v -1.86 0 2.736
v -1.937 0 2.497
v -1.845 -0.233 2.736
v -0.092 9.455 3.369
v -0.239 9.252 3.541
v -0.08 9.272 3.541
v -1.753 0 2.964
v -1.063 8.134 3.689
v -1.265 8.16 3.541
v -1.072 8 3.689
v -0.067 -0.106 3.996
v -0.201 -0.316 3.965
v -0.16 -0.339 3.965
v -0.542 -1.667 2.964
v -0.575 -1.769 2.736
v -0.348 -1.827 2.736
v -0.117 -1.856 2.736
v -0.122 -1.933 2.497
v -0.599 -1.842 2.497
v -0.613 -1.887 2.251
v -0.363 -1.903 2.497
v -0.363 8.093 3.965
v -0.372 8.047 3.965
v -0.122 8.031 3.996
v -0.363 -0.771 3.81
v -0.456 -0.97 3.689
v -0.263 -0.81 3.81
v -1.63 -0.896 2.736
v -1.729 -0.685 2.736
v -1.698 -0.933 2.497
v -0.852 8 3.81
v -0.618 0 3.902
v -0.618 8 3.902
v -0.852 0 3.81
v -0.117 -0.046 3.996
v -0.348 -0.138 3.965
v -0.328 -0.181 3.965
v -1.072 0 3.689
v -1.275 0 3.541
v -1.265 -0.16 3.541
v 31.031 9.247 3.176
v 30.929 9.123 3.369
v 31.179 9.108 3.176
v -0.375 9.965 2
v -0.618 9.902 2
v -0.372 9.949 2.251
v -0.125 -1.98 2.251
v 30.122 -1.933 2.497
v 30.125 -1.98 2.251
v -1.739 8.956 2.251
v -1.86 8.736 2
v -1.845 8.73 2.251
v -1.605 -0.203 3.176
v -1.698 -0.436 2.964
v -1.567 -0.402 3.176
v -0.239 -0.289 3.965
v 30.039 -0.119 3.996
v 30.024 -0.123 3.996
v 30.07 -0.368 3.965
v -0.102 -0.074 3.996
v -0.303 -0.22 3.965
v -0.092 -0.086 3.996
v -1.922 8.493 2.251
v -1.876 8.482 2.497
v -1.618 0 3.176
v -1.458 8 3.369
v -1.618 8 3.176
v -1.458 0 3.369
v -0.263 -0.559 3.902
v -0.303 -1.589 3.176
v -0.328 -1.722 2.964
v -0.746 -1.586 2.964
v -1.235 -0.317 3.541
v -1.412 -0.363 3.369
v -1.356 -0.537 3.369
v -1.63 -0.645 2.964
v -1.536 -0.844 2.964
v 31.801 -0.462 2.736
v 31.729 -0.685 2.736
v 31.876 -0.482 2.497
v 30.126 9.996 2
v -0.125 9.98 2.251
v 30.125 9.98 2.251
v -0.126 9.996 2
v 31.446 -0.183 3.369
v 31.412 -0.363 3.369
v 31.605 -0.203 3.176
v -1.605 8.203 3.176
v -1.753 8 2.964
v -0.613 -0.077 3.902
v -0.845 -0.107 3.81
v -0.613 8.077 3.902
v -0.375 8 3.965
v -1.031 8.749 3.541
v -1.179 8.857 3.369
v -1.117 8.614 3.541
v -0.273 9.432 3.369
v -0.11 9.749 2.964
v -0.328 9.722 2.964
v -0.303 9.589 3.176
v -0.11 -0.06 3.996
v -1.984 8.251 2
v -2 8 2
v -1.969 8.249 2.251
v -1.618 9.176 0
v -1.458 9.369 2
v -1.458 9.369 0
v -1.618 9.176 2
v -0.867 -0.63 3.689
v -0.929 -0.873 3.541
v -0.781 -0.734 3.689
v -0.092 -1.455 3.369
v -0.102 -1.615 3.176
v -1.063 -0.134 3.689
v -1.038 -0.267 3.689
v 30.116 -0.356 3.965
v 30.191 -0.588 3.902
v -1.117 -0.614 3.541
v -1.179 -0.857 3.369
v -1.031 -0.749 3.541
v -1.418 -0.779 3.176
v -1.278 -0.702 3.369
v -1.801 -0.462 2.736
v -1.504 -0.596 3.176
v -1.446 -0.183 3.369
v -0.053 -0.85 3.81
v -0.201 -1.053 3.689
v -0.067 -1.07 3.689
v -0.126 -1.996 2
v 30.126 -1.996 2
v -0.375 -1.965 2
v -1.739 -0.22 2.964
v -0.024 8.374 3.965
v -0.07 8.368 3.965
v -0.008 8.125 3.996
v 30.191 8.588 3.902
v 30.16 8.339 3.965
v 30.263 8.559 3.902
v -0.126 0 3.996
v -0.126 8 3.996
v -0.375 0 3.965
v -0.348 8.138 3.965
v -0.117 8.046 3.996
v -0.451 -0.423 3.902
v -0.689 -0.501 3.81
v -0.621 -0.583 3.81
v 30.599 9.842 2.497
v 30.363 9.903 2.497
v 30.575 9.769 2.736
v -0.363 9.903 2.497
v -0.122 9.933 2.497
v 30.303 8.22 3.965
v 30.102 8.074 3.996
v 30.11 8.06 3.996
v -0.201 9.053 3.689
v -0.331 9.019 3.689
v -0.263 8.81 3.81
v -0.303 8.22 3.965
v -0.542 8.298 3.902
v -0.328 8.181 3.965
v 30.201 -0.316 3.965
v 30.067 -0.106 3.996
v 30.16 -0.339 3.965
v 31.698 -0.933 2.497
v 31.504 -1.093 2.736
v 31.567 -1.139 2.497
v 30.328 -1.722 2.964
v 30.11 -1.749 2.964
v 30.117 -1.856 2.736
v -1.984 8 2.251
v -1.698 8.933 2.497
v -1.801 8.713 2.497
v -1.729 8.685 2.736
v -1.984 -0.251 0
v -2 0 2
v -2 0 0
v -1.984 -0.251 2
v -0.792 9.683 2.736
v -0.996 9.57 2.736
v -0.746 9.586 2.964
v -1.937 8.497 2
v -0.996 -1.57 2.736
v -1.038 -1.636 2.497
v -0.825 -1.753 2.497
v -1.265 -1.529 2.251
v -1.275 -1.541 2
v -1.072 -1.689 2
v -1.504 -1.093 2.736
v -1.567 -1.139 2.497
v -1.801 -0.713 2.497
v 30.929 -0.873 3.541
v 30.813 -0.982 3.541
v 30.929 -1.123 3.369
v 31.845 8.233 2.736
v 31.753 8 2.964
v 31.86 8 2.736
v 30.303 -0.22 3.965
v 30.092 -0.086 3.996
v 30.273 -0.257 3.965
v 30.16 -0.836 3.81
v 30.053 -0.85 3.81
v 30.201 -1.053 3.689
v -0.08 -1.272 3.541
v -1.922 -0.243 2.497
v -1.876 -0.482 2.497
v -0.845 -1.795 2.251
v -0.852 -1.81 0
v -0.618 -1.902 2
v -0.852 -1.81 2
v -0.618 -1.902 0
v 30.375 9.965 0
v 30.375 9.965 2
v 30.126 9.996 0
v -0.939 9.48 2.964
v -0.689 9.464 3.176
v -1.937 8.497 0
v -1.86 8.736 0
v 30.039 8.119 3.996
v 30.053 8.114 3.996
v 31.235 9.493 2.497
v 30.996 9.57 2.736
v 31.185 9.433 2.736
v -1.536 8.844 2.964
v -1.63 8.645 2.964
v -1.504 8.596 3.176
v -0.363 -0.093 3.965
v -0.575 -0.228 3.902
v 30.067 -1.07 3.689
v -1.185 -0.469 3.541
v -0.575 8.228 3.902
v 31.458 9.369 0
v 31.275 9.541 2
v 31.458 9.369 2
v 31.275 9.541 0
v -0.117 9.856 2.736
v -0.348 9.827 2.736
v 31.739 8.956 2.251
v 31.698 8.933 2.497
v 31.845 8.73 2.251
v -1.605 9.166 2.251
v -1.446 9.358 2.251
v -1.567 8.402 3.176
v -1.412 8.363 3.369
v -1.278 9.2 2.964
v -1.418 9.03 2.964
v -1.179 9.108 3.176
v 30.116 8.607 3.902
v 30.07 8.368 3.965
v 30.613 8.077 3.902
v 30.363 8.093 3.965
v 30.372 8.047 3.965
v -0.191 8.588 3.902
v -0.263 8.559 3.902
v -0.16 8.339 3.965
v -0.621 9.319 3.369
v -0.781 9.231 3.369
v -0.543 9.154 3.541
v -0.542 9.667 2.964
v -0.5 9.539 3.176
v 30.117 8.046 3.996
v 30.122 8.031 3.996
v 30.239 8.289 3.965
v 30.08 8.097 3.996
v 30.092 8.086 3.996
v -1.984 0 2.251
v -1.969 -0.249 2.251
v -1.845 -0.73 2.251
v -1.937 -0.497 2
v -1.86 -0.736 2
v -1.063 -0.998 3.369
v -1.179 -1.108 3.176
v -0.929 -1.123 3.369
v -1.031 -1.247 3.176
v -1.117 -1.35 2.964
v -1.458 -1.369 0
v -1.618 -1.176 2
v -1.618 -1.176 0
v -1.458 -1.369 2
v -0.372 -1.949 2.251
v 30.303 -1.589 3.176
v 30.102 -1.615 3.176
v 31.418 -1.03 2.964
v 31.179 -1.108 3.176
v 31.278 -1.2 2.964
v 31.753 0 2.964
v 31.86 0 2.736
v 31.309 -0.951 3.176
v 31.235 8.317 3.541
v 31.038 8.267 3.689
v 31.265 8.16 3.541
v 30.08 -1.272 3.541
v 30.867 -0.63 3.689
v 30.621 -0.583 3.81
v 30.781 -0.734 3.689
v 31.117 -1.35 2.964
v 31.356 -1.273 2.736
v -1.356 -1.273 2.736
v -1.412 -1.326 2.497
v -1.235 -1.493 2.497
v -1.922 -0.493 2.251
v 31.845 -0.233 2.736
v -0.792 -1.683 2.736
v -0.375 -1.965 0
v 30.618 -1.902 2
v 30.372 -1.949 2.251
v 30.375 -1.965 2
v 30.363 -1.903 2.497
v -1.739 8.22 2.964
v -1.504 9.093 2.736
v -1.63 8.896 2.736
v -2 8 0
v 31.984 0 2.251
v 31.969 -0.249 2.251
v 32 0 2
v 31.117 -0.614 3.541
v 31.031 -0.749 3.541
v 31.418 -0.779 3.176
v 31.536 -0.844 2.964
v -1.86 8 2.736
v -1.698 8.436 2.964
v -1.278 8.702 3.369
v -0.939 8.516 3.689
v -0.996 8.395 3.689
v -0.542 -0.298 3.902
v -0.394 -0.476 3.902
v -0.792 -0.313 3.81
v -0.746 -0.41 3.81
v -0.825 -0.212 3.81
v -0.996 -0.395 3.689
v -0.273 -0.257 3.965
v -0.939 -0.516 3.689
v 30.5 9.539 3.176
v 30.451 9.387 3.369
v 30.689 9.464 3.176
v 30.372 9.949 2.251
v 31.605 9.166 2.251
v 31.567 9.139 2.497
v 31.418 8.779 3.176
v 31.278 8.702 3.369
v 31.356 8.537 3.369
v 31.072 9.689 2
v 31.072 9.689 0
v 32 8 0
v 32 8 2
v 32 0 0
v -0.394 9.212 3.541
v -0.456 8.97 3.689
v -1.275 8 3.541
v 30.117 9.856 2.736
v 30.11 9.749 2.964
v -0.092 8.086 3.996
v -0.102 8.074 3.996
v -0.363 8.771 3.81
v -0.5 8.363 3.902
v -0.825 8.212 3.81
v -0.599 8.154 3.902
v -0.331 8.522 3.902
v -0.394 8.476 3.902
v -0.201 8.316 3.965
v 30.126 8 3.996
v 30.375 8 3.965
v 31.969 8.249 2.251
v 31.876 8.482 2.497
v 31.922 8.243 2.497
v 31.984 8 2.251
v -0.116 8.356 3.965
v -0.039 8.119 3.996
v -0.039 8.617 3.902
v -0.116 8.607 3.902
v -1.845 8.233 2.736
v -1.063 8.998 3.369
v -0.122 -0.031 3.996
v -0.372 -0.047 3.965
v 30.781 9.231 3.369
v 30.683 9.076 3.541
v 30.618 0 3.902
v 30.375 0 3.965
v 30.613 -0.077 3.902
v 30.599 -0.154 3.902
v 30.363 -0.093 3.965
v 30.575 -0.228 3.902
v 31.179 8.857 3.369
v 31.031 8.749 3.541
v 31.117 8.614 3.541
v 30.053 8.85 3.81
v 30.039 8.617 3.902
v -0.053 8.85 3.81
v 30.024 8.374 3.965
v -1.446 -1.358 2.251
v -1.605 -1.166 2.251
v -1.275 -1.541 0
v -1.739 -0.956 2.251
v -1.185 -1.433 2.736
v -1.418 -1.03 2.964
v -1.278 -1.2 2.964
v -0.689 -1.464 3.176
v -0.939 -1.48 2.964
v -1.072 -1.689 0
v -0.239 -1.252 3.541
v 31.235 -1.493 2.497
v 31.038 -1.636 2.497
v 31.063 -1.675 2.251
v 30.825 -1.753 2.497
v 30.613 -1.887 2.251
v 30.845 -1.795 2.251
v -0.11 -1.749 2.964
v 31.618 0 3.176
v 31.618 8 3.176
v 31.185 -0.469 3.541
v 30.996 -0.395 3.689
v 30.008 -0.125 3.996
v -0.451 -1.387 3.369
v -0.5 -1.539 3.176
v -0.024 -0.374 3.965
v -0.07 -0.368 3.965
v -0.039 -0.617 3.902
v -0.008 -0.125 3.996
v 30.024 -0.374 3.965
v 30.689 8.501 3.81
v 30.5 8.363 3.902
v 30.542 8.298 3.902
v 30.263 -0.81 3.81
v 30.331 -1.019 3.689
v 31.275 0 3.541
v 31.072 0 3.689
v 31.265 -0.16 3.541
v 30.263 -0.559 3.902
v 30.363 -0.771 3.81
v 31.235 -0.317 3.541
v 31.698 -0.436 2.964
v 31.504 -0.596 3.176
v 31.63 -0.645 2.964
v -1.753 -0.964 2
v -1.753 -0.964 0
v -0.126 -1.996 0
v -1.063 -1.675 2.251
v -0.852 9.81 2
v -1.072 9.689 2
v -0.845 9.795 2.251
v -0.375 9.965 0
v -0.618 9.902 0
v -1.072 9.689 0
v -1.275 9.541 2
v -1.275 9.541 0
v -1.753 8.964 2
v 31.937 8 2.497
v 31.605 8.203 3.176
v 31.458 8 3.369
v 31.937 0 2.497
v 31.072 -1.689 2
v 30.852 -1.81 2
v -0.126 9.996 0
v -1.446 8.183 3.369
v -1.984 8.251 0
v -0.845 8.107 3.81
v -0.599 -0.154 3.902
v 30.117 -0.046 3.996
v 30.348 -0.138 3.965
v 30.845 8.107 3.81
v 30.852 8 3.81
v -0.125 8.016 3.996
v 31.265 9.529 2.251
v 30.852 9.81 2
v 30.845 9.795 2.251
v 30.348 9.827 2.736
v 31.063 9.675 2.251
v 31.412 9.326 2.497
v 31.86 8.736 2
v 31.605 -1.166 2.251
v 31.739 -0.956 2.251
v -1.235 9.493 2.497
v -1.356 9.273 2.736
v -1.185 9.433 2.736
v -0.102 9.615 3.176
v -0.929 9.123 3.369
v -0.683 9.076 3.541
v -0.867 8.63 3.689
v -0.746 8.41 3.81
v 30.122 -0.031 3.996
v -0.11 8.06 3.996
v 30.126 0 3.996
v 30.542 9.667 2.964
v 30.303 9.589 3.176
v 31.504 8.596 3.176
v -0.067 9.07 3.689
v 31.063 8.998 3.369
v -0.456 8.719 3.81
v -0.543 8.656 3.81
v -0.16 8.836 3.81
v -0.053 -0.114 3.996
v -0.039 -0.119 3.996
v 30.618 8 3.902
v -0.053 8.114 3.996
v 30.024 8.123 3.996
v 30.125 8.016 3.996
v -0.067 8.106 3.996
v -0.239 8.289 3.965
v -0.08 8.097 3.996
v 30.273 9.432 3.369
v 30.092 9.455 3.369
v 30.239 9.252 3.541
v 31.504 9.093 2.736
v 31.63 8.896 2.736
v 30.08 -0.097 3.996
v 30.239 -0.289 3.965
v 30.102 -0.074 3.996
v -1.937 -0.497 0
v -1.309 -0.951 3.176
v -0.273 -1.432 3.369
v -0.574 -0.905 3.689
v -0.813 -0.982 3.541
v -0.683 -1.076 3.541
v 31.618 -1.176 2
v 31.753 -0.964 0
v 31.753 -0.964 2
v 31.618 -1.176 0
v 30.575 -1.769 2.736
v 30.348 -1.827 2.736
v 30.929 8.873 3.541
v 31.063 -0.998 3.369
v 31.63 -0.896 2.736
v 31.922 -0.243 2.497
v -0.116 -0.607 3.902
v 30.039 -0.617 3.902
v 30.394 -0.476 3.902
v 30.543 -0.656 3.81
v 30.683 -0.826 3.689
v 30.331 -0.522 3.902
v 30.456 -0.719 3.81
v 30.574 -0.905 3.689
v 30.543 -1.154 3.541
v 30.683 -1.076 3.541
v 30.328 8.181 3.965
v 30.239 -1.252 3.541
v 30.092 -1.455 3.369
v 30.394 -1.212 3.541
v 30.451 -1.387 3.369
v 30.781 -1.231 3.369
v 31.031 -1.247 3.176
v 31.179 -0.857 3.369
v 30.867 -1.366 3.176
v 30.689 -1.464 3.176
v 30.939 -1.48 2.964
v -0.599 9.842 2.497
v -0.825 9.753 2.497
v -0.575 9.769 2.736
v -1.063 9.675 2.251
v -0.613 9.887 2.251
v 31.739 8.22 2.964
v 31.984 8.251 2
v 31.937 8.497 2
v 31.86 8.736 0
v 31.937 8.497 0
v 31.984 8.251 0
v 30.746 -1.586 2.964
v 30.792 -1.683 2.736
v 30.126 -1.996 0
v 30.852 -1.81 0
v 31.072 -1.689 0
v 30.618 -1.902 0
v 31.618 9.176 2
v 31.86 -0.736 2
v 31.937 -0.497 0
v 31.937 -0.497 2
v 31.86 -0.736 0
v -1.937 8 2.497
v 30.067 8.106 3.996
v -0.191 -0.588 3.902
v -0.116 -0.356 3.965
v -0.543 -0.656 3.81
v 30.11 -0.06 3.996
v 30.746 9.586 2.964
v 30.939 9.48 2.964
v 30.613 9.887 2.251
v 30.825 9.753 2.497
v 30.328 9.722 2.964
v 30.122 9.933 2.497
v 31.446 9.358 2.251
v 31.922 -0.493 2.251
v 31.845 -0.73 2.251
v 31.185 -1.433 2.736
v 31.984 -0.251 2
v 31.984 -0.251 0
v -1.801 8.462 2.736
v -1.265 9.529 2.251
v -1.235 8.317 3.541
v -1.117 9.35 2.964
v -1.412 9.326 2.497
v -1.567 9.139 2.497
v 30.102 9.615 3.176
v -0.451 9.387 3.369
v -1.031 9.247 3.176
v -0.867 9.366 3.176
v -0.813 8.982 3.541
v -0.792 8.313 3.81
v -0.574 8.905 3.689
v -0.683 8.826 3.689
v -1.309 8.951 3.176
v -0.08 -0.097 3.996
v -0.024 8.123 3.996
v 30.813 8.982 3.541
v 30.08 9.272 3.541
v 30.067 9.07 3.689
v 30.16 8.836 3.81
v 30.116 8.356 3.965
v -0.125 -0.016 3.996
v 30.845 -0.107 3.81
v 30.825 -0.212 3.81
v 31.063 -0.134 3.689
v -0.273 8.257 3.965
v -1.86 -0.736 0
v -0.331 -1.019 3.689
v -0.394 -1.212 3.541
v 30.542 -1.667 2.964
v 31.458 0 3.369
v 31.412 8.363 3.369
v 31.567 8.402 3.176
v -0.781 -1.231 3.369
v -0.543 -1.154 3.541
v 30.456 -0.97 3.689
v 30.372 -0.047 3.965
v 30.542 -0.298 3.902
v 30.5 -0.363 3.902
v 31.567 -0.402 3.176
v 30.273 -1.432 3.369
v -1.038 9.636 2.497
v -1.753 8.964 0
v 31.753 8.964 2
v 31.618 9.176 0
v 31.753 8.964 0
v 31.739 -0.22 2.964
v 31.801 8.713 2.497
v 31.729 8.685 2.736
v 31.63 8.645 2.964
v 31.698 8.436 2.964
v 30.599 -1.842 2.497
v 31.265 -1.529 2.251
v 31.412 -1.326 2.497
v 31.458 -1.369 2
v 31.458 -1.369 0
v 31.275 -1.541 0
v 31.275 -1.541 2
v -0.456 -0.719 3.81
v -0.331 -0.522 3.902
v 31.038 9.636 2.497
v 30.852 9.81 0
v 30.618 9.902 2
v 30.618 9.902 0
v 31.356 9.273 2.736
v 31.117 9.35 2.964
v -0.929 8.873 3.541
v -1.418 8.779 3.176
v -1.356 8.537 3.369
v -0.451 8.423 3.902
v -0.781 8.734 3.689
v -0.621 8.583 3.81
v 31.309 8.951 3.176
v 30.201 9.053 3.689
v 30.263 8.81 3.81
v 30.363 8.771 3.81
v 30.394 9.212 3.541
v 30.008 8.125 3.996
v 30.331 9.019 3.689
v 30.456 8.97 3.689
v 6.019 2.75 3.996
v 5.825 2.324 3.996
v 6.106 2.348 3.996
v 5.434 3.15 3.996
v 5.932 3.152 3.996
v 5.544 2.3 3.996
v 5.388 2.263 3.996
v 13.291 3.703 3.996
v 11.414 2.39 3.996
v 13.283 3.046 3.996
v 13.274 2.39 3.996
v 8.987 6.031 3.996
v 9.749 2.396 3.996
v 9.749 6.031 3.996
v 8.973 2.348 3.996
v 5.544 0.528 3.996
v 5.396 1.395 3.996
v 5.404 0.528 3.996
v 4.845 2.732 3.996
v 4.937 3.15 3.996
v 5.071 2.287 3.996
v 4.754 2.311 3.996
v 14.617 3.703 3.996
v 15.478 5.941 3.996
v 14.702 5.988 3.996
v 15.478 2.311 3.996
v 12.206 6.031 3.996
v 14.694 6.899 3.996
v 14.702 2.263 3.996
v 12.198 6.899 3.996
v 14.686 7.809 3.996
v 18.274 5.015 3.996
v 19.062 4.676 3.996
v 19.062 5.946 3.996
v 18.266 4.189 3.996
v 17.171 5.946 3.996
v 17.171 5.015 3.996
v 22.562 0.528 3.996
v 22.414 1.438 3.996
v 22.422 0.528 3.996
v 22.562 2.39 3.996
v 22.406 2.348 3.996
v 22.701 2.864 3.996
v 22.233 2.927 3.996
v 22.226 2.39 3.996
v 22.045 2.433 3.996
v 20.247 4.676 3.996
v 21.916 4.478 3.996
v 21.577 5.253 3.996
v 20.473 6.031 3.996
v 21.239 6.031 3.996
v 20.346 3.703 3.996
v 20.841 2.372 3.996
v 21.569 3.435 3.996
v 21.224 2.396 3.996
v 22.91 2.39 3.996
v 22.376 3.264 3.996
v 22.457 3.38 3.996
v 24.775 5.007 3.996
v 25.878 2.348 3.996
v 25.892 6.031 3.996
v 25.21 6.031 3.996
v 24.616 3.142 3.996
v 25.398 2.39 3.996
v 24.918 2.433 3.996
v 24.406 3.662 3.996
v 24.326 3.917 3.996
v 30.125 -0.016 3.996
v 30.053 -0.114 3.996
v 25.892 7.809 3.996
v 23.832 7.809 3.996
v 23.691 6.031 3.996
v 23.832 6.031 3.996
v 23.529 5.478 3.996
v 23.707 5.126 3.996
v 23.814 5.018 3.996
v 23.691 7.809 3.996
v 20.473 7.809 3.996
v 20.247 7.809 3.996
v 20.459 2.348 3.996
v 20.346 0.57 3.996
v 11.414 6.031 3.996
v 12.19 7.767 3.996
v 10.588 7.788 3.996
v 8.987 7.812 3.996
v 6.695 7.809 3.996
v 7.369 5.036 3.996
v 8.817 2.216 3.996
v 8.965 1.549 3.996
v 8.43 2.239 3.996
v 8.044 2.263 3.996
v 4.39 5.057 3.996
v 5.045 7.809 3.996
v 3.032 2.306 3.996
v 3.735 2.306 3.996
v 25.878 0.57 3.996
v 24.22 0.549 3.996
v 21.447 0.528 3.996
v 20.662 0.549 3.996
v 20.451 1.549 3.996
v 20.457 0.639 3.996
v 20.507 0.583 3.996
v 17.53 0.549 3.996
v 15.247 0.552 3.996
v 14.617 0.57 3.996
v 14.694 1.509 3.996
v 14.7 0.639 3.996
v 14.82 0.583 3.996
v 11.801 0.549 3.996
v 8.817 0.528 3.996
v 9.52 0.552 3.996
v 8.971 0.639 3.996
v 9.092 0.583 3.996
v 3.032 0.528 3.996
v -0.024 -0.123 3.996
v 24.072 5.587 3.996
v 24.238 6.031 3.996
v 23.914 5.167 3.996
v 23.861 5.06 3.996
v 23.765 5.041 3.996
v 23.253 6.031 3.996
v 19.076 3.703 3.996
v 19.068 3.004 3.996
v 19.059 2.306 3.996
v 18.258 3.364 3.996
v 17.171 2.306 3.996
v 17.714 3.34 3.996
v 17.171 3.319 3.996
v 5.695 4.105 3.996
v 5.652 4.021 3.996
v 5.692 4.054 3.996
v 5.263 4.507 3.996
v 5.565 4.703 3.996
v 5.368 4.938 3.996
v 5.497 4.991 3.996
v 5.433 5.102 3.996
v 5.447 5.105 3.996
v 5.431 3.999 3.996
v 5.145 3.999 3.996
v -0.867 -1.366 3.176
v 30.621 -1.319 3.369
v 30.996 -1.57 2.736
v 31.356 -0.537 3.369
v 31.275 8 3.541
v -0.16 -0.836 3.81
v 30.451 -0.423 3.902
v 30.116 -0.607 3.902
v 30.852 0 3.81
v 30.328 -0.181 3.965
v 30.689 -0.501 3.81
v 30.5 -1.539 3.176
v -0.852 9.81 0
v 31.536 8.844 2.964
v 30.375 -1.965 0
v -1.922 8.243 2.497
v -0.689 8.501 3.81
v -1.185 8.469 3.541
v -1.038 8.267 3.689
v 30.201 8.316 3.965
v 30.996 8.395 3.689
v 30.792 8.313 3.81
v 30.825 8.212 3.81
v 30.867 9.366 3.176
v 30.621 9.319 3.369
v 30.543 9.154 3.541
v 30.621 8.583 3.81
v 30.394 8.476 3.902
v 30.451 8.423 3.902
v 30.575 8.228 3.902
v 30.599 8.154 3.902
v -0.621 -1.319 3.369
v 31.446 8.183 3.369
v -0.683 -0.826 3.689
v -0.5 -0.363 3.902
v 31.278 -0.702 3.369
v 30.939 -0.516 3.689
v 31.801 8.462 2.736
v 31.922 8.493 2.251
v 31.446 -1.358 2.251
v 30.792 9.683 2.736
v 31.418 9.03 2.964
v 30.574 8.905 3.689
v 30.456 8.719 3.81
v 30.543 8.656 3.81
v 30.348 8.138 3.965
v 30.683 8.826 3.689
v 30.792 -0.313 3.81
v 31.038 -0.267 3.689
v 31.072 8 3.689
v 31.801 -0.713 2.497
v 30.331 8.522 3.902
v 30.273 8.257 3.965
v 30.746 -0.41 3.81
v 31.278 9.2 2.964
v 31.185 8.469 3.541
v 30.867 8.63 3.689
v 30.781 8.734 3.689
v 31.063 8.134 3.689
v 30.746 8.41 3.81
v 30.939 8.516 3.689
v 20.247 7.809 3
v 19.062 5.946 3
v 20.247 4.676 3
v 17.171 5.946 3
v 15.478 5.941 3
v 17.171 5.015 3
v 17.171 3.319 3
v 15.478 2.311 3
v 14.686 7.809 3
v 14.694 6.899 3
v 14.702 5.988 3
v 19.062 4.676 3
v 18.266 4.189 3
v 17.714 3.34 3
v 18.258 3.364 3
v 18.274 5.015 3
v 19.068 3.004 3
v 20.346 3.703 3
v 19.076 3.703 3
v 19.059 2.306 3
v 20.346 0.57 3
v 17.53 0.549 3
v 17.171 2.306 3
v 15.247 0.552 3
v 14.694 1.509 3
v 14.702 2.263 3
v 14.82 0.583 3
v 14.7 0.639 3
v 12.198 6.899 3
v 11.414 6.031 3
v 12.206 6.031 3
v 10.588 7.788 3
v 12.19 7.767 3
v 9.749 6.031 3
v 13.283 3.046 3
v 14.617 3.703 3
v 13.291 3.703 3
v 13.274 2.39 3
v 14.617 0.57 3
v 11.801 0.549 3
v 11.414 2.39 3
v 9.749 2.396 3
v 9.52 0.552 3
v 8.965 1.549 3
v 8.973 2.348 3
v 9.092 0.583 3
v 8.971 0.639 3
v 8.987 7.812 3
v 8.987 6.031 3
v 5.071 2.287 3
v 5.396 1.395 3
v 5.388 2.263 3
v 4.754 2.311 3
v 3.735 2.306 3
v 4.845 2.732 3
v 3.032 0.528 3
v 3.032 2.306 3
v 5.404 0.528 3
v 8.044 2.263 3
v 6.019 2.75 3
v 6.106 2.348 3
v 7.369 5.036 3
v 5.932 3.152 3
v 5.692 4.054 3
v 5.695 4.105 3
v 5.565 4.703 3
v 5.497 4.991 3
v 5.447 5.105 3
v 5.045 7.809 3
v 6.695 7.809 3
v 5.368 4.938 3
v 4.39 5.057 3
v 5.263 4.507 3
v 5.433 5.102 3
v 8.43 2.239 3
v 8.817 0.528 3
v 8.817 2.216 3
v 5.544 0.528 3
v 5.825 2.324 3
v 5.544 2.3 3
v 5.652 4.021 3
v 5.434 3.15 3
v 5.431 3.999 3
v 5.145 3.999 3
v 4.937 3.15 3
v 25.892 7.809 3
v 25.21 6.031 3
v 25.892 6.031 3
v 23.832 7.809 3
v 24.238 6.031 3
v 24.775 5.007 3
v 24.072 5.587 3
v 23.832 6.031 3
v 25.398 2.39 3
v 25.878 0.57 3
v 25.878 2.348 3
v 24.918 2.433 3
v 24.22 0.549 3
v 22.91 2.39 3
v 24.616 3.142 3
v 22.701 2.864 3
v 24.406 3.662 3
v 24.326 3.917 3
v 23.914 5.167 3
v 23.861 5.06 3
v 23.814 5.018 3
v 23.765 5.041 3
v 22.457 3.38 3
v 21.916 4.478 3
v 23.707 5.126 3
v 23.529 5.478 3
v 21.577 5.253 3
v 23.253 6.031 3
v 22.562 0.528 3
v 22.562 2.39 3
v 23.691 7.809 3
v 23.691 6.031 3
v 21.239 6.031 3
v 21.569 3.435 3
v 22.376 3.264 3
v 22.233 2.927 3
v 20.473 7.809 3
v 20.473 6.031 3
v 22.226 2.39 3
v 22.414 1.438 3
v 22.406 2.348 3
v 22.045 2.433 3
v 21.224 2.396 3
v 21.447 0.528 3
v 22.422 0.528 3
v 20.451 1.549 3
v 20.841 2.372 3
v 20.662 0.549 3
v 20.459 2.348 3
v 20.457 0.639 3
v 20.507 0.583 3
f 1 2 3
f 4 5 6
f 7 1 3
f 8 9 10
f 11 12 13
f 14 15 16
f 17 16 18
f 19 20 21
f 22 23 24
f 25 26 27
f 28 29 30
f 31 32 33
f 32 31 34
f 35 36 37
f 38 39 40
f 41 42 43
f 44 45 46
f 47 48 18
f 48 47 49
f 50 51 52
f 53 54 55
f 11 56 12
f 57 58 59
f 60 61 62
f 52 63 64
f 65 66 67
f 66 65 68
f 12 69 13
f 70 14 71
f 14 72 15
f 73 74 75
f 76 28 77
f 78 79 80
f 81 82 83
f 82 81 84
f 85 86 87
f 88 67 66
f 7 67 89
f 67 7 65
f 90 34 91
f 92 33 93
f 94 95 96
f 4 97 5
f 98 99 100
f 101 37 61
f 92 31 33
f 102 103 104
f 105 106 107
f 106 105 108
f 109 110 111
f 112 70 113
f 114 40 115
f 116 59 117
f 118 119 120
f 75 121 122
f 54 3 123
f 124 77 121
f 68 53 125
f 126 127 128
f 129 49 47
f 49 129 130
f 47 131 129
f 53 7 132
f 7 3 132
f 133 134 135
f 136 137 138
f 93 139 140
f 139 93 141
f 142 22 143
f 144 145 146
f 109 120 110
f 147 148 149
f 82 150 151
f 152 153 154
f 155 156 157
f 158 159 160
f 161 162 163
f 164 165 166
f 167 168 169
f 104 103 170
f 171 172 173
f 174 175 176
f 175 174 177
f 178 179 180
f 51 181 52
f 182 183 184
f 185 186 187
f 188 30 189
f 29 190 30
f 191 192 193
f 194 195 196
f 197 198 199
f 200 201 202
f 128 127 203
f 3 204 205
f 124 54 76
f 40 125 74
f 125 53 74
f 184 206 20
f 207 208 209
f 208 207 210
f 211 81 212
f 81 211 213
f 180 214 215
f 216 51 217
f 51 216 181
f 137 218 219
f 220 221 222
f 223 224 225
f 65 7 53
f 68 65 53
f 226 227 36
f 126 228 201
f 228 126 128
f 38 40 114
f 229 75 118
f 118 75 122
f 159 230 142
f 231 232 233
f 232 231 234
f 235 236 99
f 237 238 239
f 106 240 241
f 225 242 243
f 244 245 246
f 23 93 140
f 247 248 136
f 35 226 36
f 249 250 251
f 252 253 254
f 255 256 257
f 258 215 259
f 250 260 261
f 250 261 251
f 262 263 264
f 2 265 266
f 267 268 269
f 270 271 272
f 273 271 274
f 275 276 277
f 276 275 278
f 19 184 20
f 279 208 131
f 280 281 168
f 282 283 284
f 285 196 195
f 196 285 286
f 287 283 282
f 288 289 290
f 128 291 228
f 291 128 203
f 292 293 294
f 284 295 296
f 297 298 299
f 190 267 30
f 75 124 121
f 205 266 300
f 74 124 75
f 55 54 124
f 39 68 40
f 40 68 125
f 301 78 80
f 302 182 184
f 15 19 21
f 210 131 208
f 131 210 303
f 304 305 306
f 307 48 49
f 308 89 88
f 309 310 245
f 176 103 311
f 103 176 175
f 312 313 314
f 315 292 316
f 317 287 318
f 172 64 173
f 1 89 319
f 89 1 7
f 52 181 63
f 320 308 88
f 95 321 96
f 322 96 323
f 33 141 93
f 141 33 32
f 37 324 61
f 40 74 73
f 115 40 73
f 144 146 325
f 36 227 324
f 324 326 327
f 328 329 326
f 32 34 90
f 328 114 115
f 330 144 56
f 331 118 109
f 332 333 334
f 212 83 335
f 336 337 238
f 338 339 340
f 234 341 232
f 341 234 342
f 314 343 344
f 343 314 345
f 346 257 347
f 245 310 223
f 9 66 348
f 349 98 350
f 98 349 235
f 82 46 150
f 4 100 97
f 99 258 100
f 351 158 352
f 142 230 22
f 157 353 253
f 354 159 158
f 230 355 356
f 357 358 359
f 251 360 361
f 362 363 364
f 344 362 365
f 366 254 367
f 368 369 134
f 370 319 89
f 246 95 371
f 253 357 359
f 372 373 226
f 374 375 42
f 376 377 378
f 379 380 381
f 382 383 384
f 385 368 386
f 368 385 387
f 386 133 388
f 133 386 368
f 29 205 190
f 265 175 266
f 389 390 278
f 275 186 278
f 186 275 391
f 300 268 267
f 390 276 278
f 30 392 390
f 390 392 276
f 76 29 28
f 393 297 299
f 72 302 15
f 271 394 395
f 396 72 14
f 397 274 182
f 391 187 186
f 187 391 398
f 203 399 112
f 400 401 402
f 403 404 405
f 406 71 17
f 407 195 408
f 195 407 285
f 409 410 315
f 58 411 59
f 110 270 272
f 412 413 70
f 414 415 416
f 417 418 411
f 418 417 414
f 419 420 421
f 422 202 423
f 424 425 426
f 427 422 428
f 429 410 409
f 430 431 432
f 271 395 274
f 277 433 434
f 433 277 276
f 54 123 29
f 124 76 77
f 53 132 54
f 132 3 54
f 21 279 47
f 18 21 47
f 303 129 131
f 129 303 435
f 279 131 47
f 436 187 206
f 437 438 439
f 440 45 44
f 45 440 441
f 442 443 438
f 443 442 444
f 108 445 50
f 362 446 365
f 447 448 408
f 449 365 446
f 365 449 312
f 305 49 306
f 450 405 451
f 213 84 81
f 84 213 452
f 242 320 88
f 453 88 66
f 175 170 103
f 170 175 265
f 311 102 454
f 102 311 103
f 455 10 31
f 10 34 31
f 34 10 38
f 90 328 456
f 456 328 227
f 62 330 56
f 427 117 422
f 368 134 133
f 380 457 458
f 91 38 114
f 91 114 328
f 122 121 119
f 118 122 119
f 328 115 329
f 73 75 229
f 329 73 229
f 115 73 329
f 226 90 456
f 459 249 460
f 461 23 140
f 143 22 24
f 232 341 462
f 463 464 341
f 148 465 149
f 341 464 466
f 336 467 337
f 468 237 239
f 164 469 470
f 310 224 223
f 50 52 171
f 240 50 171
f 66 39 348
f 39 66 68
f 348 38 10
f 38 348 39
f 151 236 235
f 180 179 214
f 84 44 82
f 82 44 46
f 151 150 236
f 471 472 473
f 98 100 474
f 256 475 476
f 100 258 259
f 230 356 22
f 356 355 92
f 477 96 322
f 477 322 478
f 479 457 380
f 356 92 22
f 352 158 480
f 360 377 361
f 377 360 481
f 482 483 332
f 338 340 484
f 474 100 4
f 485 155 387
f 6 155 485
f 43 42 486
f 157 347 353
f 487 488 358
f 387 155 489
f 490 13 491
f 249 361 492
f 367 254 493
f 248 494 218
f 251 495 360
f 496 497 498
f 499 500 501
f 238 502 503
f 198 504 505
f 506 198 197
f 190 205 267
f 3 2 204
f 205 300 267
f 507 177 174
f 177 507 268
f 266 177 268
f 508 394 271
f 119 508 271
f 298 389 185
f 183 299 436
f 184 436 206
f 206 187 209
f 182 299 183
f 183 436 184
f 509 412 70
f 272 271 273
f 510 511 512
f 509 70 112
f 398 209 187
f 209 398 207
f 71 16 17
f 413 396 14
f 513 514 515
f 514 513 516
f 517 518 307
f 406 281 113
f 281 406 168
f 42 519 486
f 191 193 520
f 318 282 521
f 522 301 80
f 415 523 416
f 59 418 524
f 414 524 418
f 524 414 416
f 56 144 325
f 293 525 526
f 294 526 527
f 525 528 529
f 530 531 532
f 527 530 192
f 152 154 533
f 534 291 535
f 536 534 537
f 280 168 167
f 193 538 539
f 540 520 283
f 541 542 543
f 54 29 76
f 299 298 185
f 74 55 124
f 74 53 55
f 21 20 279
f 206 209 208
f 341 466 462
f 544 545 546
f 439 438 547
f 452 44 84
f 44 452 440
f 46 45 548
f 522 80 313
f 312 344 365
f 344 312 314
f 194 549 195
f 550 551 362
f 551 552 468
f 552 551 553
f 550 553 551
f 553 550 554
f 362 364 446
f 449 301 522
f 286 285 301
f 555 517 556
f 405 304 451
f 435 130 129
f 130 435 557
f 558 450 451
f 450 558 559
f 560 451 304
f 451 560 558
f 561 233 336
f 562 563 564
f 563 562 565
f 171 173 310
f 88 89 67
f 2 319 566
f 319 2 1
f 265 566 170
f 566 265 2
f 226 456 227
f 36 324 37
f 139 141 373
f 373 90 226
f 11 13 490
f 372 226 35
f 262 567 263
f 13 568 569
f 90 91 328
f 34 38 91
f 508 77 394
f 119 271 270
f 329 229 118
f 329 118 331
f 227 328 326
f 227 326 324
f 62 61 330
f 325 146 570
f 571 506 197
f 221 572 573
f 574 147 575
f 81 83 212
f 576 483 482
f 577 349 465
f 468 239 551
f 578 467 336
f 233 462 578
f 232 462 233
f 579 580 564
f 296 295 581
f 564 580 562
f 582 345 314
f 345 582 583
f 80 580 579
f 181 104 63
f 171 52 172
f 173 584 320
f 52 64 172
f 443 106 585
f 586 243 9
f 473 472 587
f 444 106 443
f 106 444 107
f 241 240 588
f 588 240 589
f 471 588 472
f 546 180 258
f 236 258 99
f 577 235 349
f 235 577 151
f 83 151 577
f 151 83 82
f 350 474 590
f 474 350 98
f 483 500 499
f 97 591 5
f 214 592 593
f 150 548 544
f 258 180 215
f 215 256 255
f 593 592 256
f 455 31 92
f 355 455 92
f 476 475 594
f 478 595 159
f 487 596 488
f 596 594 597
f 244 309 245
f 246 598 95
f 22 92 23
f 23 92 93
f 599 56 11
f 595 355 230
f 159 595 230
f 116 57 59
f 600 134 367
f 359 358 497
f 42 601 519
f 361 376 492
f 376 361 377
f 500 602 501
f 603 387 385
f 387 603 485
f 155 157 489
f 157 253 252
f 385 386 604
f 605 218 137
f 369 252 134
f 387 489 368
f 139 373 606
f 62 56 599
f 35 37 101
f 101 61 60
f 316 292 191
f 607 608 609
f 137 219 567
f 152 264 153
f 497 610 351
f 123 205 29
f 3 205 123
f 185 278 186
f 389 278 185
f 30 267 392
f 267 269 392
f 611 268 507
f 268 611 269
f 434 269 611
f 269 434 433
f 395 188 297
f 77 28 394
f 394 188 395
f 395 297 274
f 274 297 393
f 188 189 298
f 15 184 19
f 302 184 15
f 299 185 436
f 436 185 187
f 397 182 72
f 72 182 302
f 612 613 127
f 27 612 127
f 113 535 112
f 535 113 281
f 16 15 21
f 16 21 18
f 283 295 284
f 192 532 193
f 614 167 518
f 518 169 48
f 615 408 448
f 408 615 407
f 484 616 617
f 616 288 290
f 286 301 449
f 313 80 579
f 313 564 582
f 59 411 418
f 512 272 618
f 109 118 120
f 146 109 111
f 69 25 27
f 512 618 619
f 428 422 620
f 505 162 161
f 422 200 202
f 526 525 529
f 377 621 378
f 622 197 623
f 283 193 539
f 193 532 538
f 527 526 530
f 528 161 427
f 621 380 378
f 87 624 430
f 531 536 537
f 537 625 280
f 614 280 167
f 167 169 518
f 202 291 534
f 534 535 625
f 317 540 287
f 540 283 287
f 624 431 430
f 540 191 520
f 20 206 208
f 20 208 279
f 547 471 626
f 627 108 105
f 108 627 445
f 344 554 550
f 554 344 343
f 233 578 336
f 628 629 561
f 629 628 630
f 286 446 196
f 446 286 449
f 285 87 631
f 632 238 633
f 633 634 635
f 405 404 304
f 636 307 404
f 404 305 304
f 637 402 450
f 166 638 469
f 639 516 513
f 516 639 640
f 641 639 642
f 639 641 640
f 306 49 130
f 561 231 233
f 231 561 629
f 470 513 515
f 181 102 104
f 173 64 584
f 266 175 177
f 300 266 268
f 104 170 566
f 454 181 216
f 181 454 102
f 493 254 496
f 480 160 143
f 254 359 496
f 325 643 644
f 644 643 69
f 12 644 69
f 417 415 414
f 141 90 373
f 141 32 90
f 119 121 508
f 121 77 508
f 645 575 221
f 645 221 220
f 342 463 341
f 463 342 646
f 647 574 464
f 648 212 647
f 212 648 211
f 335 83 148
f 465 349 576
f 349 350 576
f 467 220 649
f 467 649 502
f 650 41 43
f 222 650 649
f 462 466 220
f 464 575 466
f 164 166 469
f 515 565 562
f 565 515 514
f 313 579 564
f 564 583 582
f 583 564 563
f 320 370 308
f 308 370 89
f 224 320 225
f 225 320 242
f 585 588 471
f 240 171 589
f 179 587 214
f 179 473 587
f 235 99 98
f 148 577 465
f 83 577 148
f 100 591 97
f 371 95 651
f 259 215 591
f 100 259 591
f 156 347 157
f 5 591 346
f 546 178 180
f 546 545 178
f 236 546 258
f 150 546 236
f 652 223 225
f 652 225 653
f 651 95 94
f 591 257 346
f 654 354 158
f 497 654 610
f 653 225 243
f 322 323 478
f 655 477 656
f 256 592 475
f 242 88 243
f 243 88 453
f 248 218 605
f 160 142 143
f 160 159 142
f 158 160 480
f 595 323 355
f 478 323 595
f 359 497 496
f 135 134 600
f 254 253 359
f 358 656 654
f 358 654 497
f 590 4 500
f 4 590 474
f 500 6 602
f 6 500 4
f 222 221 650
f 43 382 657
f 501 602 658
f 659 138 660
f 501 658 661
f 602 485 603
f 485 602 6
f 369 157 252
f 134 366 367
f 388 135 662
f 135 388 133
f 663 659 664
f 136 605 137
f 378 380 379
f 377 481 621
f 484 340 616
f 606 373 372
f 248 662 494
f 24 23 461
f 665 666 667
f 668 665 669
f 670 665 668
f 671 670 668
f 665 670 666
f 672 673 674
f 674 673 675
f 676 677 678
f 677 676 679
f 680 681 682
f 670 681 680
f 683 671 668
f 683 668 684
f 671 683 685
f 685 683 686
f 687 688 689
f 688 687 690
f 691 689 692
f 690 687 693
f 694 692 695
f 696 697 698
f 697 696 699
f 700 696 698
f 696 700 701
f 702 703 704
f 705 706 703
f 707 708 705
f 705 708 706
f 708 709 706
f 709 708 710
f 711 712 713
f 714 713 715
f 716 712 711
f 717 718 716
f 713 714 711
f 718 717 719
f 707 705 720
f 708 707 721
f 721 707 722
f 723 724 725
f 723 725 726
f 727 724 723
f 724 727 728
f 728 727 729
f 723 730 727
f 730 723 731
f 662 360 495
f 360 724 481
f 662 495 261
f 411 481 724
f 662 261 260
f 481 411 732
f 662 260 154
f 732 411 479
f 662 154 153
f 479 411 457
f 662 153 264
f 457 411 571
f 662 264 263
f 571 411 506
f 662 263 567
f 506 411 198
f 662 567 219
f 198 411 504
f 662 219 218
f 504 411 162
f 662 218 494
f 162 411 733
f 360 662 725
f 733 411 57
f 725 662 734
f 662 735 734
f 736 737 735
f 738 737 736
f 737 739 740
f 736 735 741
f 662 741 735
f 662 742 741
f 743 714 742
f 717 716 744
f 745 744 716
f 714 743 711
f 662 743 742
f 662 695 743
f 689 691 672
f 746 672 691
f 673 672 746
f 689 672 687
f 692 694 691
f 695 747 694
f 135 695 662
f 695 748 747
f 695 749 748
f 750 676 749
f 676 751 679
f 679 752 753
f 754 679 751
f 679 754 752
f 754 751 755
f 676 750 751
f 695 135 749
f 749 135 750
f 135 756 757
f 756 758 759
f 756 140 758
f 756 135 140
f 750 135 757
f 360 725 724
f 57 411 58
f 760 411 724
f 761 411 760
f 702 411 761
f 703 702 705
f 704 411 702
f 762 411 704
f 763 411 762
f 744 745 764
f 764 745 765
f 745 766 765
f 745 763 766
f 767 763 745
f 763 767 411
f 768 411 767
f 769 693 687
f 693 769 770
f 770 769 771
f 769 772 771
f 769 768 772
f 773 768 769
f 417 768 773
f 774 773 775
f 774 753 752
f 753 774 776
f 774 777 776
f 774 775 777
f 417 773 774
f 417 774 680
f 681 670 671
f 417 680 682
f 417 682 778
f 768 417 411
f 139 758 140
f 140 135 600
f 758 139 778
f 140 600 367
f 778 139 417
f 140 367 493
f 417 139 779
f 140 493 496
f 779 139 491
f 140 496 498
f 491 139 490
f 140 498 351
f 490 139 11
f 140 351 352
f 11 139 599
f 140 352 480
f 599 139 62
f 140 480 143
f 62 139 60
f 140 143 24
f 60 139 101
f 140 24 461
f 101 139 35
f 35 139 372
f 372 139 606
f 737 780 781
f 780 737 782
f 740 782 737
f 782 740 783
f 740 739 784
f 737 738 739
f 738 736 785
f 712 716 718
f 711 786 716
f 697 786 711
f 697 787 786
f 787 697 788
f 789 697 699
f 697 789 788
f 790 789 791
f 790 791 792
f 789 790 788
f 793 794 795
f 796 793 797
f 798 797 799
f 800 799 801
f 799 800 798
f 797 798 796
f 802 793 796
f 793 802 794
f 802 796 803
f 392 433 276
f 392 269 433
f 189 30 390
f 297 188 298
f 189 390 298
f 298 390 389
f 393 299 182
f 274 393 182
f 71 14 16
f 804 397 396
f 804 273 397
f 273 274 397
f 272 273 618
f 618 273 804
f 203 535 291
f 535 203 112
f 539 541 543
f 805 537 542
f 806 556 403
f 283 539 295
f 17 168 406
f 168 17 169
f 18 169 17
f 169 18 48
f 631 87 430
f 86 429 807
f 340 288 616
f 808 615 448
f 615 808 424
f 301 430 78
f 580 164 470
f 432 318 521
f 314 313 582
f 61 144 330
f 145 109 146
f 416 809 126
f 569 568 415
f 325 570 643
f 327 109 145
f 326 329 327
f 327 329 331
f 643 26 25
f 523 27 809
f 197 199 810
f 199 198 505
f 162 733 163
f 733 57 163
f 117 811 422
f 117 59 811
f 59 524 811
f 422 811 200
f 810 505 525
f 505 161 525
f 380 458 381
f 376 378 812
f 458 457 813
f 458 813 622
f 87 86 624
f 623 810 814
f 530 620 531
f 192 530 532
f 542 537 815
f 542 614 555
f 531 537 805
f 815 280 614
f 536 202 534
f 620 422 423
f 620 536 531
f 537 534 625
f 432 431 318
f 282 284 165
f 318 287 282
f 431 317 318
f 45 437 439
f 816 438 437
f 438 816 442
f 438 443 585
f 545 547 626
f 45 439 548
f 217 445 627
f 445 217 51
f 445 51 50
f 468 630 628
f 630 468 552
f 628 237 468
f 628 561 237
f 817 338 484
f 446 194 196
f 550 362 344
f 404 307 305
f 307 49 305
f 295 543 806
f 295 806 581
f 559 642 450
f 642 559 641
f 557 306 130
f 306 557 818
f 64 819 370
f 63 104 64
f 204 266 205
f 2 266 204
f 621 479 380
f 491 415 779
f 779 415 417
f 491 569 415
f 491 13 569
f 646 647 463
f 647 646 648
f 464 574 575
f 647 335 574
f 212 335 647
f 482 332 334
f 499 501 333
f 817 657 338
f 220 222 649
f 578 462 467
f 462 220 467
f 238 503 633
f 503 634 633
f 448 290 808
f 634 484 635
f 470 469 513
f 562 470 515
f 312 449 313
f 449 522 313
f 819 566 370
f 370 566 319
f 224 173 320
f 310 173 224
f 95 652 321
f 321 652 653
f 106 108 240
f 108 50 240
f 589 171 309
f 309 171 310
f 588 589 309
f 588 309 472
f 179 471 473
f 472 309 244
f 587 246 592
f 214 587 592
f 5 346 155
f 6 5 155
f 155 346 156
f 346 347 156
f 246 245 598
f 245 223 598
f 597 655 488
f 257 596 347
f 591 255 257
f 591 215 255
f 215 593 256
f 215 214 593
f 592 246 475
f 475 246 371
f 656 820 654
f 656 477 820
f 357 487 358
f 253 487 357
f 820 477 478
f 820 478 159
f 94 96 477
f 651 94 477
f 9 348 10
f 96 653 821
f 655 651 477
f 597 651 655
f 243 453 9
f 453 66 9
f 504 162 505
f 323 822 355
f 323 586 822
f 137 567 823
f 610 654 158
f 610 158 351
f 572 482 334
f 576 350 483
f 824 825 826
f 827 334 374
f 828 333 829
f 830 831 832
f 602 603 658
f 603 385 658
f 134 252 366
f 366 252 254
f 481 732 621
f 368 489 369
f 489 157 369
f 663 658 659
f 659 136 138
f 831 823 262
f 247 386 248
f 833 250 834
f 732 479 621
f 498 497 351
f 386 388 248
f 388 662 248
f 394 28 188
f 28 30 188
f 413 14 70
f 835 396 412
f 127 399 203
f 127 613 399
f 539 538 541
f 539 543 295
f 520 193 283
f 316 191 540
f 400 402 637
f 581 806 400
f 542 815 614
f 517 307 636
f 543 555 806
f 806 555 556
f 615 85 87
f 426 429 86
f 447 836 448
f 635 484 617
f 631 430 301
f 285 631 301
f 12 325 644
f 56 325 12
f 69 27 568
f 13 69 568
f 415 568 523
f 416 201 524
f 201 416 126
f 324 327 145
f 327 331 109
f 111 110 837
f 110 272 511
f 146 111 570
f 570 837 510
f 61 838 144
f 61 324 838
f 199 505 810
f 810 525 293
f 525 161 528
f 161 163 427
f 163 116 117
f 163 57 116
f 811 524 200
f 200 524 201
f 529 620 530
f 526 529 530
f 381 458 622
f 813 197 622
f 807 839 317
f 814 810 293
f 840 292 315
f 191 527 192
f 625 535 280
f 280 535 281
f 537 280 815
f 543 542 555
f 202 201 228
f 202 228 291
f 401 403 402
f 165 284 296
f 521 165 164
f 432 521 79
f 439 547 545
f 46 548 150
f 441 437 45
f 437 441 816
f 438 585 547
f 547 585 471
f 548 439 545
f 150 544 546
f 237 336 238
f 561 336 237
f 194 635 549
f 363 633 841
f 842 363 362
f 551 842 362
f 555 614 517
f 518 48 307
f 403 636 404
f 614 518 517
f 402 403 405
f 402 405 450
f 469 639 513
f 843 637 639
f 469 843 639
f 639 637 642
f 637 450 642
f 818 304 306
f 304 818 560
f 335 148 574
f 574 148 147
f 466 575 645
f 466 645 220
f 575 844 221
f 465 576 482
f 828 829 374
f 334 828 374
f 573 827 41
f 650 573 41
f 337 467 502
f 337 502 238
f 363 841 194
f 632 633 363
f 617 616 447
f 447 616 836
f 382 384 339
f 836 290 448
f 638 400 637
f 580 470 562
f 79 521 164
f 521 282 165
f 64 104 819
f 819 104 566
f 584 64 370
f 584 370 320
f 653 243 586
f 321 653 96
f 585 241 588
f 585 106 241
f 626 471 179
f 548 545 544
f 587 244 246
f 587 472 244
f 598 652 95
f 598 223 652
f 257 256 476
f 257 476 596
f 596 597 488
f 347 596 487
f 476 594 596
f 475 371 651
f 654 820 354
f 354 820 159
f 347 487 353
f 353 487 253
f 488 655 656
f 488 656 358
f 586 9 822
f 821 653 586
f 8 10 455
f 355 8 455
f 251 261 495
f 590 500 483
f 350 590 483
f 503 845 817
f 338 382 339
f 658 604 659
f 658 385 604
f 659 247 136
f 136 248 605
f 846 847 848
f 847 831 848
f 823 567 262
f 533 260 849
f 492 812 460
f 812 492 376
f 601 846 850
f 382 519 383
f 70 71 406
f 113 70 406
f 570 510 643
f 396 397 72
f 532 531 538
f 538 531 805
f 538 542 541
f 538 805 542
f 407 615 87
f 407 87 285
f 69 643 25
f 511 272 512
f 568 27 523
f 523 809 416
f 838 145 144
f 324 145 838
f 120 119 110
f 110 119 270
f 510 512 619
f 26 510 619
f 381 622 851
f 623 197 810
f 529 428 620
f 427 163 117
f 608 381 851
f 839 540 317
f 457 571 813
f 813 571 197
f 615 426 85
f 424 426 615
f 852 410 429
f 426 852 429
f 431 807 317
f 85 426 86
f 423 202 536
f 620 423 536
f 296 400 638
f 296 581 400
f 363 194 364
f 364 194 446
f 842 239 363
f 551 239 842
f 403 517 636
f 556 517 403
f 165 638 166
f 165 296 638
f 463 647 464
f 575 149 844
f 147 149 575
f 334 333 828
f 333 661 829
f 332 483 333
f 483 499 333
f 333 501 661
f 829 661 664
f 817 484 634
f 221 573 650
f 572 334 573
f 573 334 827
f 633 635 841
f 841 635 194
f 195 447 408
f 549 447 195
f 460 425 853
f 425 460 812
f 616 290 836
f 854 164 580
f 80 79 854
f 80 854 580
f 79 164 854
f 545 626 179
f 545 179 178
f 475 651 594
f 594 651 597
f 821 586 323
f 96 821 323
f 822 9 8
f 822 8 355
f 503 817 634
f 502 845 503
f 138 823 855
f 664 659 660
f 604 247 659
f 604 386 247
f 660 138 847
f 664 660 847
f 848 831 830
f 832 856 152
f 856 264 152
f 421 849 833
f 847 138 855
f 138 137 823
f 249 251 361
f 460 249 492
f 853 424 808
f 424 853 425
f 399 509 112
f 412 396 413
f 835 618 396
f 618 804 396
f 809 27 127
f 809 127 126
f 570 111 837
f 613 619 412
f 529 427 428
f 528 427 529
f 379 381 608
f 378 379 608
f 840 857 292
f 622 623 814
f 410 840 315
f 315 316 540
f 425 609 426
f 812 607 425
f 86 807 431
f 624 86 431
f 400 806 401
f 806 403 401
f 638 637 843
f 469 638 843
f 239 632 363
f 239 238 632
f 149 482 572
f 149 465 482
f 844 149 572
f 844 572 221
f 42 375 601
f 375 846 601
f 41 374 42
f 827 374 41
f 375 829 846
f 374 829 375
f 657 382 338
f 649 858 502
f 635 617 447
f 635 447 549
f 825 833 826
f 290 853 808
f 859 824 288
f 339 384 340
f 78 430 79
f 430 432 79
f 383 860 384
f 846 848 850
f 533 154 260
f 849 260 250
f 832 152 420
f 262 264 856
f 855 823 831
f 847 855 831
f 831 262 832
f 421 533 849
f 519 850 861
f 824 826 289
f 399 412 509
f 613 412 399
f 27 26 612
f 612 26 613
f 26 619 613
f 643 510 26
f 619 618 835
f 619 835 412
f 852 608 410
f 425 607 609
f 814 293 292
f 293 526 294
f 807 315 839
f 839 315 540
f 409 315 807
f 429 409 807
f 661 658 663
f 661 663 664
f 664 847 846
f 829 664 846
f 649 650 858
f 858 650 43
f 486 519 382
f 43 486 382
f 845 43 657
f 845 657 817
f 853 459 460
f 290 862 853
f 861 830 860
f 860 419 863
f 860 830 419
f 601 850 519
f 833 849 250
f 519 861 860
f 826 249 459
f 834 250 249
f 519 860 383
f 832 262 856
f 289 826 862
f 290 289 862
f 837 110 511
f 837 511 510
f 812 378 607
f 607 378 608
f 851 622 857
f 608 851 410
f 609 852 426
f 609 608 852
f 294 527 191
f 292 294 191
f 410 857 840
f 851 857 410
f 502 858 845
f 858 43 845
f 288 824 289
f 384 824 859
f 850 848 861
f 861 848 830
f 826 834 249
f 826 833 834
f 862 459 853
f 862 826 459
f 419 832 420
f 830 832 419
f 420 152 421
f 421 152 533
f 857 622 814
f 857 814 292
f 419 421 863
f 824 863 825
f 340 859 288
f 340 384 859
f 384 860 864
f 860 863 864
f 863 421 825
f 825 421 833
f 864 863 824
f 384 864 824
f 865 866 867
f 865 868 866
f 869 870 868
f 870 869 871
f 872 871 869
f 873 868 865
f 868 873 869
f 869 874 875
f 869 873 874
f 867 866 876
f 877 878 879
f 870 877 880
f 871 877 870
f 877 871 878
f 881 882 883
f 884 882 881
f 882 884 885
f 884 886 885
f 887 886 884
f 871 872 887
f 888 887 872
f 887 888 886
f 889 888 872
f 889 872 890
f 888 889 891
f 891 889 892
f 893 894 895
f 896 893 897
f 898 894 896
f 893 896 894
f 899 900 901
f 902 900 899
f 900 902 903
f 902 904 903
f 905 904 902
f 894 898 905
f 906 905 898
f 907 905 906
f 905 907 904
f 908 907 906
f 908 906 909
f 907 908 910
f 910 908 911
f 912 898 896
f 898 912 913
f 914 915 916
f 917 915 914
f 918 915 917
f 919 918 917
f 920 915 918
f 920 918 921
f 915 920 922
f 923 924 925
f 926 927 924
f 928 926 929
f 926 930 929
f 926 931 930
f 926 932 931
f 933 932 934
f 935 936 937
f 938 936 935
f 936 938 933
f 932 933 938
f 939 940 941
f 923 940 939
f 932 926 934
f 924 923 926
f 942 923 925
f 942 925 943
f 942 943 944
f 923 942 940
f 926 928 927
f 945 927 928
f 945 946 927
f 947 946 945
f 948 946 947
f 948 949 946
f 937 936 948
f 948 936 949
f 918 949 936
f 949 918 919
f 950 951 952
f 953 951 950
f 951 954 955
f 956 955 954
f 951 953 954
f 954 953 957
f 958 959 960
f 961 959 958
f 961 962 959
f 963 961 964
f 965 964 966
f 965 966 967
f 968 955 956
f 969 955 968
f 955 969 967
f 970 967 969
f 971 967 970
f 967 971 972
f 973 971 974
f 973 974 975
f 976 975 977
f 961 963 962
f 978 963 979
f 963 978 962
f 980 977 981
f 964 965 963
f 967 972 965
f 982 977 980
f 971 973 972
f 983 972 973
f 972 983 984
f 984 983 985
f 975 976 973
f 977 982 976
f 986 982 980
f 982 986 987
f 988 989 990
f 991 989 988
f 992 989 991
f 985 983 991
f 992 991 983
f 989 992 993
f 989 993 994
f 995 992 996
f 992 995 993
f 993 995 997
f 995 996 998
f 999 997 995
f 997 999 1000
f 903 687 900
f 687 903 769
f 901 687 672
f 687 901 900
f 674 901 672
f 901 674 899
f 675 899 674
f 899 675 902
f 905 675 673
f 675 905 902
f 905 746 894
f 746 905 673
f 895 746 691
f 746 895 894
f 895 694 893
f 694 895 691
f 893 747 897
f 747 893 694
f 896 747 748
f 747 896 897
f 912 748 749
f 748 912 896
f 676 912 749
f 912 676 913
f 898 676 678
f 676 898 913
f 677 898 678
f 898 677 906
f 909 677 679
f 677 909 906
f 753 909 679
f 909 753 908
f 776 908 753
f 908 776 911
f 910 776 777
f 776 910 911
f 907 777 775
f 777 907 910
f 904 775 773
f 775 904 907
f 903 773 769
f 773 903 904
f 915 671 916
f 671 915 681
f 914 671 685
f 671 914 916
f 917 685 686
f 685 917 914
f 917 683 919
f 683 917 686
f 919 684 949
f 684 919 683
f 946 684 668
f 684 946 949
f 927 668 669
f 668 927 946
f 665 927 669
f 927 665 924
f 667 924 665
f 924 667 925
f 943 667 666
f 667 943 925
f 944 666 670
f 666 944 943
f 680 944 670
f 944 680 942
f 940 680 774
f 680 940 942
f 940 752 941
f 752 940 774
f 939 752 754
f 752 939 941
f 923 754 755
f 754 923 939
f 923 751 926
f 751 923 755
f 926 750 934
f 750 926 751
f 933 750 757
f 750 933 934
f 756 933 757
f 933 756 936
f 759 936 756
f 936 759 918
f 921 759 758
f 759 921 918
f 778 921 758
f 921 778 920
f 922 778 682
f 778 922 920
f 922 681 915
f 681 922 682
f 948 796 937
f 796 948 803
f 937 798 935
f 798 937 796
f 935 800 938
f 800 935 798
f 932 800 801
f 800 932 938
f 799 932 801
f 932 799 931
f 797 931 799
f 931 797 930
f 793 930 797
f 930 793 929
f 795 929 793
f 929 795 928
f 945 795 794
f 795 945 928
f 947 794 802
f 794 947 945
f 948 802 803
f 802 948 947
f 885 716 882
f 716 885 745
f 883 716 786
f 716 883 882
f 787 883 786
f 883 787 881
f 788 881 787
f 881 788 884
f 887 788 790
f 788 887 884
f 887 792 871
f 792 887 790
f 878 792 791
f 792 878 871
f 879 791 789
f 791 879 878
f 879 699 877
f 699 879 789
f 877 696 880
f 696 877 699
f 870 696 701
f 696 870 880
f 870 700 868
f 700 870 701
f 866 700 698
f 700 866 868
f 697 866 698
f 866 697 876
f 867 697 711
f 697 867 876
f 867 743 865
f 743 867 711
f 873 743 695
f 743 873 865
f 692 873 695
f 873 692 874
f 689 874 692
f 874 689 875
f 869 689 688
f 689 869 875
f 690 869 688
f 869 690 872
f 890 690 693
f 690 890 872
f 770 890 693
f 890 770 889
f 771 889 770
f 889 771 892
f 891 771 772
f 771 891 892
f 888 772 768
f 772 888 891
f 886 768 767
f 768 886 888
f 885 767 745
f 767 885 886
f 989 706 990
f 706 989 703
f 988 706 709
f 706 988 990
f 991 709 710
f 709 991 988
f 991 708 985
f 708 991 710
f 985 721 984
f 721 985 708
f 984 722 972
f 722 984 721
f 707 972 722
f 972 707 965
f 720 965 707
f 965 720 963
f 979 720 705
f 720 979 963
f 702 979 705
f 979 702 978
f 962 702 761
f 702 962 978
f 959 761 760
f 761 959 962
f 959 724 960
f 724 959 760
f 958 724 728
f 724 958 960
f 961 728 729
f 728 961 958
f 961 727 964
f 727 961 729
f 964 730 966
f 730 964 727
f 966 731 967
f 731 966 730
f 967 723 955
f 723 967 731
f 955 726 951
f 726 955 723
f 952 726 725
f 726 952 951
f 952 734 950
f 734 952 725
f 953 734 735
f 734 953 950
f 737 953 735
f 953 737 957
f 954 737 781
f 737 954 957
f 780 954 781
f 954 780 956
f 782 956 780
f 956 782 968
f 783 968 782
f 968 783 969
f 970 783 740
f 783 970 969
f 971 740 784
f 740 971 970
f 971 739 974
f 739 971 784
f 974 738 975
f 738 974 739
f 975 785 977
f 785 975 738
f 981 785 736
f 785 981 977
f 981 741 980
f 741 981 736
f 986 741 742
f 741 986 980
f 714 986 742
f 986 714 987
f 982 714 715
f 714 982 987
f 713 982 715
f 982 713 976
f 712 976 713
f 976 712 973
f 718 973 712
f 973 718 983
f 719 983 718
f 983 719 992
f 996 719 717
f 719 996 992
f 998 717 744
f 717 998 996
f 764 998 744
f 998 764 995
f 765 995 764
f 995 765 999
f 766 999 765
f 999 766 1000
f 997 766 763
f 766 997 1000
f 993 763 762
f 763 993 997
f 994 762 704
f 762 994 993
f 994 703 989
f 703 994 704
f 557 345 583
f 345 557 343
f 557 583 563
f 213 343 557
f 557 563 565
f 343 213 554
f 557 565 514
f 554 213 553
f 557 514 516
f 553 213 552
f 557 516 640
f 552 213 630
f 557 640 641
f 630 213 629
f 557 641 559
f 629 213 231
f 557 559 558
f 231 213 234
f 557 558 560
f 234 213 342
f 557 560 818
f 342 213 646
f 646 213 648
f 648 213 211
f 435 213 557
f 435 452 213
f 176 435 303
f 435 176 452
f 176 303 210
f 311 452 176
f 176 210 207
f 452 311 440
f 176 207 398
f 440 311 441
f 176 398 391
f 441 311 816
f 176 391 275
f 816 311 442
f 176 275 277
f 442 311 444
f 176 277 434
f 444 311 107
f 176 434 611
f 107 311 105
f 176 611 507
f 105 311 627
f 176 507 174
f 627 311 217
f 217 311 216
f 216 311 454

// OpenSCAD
difference(){
    minkowski (){
        cube([30,8,2]);
        sphere (2, $fn=50);
    }
    translate([3,0.5,3])
    linear_extrude(2) scale([0.10,0.3]) import("alex.dxf");
    translate([-2,-2,-3]) cube([50,30,3]);
}
